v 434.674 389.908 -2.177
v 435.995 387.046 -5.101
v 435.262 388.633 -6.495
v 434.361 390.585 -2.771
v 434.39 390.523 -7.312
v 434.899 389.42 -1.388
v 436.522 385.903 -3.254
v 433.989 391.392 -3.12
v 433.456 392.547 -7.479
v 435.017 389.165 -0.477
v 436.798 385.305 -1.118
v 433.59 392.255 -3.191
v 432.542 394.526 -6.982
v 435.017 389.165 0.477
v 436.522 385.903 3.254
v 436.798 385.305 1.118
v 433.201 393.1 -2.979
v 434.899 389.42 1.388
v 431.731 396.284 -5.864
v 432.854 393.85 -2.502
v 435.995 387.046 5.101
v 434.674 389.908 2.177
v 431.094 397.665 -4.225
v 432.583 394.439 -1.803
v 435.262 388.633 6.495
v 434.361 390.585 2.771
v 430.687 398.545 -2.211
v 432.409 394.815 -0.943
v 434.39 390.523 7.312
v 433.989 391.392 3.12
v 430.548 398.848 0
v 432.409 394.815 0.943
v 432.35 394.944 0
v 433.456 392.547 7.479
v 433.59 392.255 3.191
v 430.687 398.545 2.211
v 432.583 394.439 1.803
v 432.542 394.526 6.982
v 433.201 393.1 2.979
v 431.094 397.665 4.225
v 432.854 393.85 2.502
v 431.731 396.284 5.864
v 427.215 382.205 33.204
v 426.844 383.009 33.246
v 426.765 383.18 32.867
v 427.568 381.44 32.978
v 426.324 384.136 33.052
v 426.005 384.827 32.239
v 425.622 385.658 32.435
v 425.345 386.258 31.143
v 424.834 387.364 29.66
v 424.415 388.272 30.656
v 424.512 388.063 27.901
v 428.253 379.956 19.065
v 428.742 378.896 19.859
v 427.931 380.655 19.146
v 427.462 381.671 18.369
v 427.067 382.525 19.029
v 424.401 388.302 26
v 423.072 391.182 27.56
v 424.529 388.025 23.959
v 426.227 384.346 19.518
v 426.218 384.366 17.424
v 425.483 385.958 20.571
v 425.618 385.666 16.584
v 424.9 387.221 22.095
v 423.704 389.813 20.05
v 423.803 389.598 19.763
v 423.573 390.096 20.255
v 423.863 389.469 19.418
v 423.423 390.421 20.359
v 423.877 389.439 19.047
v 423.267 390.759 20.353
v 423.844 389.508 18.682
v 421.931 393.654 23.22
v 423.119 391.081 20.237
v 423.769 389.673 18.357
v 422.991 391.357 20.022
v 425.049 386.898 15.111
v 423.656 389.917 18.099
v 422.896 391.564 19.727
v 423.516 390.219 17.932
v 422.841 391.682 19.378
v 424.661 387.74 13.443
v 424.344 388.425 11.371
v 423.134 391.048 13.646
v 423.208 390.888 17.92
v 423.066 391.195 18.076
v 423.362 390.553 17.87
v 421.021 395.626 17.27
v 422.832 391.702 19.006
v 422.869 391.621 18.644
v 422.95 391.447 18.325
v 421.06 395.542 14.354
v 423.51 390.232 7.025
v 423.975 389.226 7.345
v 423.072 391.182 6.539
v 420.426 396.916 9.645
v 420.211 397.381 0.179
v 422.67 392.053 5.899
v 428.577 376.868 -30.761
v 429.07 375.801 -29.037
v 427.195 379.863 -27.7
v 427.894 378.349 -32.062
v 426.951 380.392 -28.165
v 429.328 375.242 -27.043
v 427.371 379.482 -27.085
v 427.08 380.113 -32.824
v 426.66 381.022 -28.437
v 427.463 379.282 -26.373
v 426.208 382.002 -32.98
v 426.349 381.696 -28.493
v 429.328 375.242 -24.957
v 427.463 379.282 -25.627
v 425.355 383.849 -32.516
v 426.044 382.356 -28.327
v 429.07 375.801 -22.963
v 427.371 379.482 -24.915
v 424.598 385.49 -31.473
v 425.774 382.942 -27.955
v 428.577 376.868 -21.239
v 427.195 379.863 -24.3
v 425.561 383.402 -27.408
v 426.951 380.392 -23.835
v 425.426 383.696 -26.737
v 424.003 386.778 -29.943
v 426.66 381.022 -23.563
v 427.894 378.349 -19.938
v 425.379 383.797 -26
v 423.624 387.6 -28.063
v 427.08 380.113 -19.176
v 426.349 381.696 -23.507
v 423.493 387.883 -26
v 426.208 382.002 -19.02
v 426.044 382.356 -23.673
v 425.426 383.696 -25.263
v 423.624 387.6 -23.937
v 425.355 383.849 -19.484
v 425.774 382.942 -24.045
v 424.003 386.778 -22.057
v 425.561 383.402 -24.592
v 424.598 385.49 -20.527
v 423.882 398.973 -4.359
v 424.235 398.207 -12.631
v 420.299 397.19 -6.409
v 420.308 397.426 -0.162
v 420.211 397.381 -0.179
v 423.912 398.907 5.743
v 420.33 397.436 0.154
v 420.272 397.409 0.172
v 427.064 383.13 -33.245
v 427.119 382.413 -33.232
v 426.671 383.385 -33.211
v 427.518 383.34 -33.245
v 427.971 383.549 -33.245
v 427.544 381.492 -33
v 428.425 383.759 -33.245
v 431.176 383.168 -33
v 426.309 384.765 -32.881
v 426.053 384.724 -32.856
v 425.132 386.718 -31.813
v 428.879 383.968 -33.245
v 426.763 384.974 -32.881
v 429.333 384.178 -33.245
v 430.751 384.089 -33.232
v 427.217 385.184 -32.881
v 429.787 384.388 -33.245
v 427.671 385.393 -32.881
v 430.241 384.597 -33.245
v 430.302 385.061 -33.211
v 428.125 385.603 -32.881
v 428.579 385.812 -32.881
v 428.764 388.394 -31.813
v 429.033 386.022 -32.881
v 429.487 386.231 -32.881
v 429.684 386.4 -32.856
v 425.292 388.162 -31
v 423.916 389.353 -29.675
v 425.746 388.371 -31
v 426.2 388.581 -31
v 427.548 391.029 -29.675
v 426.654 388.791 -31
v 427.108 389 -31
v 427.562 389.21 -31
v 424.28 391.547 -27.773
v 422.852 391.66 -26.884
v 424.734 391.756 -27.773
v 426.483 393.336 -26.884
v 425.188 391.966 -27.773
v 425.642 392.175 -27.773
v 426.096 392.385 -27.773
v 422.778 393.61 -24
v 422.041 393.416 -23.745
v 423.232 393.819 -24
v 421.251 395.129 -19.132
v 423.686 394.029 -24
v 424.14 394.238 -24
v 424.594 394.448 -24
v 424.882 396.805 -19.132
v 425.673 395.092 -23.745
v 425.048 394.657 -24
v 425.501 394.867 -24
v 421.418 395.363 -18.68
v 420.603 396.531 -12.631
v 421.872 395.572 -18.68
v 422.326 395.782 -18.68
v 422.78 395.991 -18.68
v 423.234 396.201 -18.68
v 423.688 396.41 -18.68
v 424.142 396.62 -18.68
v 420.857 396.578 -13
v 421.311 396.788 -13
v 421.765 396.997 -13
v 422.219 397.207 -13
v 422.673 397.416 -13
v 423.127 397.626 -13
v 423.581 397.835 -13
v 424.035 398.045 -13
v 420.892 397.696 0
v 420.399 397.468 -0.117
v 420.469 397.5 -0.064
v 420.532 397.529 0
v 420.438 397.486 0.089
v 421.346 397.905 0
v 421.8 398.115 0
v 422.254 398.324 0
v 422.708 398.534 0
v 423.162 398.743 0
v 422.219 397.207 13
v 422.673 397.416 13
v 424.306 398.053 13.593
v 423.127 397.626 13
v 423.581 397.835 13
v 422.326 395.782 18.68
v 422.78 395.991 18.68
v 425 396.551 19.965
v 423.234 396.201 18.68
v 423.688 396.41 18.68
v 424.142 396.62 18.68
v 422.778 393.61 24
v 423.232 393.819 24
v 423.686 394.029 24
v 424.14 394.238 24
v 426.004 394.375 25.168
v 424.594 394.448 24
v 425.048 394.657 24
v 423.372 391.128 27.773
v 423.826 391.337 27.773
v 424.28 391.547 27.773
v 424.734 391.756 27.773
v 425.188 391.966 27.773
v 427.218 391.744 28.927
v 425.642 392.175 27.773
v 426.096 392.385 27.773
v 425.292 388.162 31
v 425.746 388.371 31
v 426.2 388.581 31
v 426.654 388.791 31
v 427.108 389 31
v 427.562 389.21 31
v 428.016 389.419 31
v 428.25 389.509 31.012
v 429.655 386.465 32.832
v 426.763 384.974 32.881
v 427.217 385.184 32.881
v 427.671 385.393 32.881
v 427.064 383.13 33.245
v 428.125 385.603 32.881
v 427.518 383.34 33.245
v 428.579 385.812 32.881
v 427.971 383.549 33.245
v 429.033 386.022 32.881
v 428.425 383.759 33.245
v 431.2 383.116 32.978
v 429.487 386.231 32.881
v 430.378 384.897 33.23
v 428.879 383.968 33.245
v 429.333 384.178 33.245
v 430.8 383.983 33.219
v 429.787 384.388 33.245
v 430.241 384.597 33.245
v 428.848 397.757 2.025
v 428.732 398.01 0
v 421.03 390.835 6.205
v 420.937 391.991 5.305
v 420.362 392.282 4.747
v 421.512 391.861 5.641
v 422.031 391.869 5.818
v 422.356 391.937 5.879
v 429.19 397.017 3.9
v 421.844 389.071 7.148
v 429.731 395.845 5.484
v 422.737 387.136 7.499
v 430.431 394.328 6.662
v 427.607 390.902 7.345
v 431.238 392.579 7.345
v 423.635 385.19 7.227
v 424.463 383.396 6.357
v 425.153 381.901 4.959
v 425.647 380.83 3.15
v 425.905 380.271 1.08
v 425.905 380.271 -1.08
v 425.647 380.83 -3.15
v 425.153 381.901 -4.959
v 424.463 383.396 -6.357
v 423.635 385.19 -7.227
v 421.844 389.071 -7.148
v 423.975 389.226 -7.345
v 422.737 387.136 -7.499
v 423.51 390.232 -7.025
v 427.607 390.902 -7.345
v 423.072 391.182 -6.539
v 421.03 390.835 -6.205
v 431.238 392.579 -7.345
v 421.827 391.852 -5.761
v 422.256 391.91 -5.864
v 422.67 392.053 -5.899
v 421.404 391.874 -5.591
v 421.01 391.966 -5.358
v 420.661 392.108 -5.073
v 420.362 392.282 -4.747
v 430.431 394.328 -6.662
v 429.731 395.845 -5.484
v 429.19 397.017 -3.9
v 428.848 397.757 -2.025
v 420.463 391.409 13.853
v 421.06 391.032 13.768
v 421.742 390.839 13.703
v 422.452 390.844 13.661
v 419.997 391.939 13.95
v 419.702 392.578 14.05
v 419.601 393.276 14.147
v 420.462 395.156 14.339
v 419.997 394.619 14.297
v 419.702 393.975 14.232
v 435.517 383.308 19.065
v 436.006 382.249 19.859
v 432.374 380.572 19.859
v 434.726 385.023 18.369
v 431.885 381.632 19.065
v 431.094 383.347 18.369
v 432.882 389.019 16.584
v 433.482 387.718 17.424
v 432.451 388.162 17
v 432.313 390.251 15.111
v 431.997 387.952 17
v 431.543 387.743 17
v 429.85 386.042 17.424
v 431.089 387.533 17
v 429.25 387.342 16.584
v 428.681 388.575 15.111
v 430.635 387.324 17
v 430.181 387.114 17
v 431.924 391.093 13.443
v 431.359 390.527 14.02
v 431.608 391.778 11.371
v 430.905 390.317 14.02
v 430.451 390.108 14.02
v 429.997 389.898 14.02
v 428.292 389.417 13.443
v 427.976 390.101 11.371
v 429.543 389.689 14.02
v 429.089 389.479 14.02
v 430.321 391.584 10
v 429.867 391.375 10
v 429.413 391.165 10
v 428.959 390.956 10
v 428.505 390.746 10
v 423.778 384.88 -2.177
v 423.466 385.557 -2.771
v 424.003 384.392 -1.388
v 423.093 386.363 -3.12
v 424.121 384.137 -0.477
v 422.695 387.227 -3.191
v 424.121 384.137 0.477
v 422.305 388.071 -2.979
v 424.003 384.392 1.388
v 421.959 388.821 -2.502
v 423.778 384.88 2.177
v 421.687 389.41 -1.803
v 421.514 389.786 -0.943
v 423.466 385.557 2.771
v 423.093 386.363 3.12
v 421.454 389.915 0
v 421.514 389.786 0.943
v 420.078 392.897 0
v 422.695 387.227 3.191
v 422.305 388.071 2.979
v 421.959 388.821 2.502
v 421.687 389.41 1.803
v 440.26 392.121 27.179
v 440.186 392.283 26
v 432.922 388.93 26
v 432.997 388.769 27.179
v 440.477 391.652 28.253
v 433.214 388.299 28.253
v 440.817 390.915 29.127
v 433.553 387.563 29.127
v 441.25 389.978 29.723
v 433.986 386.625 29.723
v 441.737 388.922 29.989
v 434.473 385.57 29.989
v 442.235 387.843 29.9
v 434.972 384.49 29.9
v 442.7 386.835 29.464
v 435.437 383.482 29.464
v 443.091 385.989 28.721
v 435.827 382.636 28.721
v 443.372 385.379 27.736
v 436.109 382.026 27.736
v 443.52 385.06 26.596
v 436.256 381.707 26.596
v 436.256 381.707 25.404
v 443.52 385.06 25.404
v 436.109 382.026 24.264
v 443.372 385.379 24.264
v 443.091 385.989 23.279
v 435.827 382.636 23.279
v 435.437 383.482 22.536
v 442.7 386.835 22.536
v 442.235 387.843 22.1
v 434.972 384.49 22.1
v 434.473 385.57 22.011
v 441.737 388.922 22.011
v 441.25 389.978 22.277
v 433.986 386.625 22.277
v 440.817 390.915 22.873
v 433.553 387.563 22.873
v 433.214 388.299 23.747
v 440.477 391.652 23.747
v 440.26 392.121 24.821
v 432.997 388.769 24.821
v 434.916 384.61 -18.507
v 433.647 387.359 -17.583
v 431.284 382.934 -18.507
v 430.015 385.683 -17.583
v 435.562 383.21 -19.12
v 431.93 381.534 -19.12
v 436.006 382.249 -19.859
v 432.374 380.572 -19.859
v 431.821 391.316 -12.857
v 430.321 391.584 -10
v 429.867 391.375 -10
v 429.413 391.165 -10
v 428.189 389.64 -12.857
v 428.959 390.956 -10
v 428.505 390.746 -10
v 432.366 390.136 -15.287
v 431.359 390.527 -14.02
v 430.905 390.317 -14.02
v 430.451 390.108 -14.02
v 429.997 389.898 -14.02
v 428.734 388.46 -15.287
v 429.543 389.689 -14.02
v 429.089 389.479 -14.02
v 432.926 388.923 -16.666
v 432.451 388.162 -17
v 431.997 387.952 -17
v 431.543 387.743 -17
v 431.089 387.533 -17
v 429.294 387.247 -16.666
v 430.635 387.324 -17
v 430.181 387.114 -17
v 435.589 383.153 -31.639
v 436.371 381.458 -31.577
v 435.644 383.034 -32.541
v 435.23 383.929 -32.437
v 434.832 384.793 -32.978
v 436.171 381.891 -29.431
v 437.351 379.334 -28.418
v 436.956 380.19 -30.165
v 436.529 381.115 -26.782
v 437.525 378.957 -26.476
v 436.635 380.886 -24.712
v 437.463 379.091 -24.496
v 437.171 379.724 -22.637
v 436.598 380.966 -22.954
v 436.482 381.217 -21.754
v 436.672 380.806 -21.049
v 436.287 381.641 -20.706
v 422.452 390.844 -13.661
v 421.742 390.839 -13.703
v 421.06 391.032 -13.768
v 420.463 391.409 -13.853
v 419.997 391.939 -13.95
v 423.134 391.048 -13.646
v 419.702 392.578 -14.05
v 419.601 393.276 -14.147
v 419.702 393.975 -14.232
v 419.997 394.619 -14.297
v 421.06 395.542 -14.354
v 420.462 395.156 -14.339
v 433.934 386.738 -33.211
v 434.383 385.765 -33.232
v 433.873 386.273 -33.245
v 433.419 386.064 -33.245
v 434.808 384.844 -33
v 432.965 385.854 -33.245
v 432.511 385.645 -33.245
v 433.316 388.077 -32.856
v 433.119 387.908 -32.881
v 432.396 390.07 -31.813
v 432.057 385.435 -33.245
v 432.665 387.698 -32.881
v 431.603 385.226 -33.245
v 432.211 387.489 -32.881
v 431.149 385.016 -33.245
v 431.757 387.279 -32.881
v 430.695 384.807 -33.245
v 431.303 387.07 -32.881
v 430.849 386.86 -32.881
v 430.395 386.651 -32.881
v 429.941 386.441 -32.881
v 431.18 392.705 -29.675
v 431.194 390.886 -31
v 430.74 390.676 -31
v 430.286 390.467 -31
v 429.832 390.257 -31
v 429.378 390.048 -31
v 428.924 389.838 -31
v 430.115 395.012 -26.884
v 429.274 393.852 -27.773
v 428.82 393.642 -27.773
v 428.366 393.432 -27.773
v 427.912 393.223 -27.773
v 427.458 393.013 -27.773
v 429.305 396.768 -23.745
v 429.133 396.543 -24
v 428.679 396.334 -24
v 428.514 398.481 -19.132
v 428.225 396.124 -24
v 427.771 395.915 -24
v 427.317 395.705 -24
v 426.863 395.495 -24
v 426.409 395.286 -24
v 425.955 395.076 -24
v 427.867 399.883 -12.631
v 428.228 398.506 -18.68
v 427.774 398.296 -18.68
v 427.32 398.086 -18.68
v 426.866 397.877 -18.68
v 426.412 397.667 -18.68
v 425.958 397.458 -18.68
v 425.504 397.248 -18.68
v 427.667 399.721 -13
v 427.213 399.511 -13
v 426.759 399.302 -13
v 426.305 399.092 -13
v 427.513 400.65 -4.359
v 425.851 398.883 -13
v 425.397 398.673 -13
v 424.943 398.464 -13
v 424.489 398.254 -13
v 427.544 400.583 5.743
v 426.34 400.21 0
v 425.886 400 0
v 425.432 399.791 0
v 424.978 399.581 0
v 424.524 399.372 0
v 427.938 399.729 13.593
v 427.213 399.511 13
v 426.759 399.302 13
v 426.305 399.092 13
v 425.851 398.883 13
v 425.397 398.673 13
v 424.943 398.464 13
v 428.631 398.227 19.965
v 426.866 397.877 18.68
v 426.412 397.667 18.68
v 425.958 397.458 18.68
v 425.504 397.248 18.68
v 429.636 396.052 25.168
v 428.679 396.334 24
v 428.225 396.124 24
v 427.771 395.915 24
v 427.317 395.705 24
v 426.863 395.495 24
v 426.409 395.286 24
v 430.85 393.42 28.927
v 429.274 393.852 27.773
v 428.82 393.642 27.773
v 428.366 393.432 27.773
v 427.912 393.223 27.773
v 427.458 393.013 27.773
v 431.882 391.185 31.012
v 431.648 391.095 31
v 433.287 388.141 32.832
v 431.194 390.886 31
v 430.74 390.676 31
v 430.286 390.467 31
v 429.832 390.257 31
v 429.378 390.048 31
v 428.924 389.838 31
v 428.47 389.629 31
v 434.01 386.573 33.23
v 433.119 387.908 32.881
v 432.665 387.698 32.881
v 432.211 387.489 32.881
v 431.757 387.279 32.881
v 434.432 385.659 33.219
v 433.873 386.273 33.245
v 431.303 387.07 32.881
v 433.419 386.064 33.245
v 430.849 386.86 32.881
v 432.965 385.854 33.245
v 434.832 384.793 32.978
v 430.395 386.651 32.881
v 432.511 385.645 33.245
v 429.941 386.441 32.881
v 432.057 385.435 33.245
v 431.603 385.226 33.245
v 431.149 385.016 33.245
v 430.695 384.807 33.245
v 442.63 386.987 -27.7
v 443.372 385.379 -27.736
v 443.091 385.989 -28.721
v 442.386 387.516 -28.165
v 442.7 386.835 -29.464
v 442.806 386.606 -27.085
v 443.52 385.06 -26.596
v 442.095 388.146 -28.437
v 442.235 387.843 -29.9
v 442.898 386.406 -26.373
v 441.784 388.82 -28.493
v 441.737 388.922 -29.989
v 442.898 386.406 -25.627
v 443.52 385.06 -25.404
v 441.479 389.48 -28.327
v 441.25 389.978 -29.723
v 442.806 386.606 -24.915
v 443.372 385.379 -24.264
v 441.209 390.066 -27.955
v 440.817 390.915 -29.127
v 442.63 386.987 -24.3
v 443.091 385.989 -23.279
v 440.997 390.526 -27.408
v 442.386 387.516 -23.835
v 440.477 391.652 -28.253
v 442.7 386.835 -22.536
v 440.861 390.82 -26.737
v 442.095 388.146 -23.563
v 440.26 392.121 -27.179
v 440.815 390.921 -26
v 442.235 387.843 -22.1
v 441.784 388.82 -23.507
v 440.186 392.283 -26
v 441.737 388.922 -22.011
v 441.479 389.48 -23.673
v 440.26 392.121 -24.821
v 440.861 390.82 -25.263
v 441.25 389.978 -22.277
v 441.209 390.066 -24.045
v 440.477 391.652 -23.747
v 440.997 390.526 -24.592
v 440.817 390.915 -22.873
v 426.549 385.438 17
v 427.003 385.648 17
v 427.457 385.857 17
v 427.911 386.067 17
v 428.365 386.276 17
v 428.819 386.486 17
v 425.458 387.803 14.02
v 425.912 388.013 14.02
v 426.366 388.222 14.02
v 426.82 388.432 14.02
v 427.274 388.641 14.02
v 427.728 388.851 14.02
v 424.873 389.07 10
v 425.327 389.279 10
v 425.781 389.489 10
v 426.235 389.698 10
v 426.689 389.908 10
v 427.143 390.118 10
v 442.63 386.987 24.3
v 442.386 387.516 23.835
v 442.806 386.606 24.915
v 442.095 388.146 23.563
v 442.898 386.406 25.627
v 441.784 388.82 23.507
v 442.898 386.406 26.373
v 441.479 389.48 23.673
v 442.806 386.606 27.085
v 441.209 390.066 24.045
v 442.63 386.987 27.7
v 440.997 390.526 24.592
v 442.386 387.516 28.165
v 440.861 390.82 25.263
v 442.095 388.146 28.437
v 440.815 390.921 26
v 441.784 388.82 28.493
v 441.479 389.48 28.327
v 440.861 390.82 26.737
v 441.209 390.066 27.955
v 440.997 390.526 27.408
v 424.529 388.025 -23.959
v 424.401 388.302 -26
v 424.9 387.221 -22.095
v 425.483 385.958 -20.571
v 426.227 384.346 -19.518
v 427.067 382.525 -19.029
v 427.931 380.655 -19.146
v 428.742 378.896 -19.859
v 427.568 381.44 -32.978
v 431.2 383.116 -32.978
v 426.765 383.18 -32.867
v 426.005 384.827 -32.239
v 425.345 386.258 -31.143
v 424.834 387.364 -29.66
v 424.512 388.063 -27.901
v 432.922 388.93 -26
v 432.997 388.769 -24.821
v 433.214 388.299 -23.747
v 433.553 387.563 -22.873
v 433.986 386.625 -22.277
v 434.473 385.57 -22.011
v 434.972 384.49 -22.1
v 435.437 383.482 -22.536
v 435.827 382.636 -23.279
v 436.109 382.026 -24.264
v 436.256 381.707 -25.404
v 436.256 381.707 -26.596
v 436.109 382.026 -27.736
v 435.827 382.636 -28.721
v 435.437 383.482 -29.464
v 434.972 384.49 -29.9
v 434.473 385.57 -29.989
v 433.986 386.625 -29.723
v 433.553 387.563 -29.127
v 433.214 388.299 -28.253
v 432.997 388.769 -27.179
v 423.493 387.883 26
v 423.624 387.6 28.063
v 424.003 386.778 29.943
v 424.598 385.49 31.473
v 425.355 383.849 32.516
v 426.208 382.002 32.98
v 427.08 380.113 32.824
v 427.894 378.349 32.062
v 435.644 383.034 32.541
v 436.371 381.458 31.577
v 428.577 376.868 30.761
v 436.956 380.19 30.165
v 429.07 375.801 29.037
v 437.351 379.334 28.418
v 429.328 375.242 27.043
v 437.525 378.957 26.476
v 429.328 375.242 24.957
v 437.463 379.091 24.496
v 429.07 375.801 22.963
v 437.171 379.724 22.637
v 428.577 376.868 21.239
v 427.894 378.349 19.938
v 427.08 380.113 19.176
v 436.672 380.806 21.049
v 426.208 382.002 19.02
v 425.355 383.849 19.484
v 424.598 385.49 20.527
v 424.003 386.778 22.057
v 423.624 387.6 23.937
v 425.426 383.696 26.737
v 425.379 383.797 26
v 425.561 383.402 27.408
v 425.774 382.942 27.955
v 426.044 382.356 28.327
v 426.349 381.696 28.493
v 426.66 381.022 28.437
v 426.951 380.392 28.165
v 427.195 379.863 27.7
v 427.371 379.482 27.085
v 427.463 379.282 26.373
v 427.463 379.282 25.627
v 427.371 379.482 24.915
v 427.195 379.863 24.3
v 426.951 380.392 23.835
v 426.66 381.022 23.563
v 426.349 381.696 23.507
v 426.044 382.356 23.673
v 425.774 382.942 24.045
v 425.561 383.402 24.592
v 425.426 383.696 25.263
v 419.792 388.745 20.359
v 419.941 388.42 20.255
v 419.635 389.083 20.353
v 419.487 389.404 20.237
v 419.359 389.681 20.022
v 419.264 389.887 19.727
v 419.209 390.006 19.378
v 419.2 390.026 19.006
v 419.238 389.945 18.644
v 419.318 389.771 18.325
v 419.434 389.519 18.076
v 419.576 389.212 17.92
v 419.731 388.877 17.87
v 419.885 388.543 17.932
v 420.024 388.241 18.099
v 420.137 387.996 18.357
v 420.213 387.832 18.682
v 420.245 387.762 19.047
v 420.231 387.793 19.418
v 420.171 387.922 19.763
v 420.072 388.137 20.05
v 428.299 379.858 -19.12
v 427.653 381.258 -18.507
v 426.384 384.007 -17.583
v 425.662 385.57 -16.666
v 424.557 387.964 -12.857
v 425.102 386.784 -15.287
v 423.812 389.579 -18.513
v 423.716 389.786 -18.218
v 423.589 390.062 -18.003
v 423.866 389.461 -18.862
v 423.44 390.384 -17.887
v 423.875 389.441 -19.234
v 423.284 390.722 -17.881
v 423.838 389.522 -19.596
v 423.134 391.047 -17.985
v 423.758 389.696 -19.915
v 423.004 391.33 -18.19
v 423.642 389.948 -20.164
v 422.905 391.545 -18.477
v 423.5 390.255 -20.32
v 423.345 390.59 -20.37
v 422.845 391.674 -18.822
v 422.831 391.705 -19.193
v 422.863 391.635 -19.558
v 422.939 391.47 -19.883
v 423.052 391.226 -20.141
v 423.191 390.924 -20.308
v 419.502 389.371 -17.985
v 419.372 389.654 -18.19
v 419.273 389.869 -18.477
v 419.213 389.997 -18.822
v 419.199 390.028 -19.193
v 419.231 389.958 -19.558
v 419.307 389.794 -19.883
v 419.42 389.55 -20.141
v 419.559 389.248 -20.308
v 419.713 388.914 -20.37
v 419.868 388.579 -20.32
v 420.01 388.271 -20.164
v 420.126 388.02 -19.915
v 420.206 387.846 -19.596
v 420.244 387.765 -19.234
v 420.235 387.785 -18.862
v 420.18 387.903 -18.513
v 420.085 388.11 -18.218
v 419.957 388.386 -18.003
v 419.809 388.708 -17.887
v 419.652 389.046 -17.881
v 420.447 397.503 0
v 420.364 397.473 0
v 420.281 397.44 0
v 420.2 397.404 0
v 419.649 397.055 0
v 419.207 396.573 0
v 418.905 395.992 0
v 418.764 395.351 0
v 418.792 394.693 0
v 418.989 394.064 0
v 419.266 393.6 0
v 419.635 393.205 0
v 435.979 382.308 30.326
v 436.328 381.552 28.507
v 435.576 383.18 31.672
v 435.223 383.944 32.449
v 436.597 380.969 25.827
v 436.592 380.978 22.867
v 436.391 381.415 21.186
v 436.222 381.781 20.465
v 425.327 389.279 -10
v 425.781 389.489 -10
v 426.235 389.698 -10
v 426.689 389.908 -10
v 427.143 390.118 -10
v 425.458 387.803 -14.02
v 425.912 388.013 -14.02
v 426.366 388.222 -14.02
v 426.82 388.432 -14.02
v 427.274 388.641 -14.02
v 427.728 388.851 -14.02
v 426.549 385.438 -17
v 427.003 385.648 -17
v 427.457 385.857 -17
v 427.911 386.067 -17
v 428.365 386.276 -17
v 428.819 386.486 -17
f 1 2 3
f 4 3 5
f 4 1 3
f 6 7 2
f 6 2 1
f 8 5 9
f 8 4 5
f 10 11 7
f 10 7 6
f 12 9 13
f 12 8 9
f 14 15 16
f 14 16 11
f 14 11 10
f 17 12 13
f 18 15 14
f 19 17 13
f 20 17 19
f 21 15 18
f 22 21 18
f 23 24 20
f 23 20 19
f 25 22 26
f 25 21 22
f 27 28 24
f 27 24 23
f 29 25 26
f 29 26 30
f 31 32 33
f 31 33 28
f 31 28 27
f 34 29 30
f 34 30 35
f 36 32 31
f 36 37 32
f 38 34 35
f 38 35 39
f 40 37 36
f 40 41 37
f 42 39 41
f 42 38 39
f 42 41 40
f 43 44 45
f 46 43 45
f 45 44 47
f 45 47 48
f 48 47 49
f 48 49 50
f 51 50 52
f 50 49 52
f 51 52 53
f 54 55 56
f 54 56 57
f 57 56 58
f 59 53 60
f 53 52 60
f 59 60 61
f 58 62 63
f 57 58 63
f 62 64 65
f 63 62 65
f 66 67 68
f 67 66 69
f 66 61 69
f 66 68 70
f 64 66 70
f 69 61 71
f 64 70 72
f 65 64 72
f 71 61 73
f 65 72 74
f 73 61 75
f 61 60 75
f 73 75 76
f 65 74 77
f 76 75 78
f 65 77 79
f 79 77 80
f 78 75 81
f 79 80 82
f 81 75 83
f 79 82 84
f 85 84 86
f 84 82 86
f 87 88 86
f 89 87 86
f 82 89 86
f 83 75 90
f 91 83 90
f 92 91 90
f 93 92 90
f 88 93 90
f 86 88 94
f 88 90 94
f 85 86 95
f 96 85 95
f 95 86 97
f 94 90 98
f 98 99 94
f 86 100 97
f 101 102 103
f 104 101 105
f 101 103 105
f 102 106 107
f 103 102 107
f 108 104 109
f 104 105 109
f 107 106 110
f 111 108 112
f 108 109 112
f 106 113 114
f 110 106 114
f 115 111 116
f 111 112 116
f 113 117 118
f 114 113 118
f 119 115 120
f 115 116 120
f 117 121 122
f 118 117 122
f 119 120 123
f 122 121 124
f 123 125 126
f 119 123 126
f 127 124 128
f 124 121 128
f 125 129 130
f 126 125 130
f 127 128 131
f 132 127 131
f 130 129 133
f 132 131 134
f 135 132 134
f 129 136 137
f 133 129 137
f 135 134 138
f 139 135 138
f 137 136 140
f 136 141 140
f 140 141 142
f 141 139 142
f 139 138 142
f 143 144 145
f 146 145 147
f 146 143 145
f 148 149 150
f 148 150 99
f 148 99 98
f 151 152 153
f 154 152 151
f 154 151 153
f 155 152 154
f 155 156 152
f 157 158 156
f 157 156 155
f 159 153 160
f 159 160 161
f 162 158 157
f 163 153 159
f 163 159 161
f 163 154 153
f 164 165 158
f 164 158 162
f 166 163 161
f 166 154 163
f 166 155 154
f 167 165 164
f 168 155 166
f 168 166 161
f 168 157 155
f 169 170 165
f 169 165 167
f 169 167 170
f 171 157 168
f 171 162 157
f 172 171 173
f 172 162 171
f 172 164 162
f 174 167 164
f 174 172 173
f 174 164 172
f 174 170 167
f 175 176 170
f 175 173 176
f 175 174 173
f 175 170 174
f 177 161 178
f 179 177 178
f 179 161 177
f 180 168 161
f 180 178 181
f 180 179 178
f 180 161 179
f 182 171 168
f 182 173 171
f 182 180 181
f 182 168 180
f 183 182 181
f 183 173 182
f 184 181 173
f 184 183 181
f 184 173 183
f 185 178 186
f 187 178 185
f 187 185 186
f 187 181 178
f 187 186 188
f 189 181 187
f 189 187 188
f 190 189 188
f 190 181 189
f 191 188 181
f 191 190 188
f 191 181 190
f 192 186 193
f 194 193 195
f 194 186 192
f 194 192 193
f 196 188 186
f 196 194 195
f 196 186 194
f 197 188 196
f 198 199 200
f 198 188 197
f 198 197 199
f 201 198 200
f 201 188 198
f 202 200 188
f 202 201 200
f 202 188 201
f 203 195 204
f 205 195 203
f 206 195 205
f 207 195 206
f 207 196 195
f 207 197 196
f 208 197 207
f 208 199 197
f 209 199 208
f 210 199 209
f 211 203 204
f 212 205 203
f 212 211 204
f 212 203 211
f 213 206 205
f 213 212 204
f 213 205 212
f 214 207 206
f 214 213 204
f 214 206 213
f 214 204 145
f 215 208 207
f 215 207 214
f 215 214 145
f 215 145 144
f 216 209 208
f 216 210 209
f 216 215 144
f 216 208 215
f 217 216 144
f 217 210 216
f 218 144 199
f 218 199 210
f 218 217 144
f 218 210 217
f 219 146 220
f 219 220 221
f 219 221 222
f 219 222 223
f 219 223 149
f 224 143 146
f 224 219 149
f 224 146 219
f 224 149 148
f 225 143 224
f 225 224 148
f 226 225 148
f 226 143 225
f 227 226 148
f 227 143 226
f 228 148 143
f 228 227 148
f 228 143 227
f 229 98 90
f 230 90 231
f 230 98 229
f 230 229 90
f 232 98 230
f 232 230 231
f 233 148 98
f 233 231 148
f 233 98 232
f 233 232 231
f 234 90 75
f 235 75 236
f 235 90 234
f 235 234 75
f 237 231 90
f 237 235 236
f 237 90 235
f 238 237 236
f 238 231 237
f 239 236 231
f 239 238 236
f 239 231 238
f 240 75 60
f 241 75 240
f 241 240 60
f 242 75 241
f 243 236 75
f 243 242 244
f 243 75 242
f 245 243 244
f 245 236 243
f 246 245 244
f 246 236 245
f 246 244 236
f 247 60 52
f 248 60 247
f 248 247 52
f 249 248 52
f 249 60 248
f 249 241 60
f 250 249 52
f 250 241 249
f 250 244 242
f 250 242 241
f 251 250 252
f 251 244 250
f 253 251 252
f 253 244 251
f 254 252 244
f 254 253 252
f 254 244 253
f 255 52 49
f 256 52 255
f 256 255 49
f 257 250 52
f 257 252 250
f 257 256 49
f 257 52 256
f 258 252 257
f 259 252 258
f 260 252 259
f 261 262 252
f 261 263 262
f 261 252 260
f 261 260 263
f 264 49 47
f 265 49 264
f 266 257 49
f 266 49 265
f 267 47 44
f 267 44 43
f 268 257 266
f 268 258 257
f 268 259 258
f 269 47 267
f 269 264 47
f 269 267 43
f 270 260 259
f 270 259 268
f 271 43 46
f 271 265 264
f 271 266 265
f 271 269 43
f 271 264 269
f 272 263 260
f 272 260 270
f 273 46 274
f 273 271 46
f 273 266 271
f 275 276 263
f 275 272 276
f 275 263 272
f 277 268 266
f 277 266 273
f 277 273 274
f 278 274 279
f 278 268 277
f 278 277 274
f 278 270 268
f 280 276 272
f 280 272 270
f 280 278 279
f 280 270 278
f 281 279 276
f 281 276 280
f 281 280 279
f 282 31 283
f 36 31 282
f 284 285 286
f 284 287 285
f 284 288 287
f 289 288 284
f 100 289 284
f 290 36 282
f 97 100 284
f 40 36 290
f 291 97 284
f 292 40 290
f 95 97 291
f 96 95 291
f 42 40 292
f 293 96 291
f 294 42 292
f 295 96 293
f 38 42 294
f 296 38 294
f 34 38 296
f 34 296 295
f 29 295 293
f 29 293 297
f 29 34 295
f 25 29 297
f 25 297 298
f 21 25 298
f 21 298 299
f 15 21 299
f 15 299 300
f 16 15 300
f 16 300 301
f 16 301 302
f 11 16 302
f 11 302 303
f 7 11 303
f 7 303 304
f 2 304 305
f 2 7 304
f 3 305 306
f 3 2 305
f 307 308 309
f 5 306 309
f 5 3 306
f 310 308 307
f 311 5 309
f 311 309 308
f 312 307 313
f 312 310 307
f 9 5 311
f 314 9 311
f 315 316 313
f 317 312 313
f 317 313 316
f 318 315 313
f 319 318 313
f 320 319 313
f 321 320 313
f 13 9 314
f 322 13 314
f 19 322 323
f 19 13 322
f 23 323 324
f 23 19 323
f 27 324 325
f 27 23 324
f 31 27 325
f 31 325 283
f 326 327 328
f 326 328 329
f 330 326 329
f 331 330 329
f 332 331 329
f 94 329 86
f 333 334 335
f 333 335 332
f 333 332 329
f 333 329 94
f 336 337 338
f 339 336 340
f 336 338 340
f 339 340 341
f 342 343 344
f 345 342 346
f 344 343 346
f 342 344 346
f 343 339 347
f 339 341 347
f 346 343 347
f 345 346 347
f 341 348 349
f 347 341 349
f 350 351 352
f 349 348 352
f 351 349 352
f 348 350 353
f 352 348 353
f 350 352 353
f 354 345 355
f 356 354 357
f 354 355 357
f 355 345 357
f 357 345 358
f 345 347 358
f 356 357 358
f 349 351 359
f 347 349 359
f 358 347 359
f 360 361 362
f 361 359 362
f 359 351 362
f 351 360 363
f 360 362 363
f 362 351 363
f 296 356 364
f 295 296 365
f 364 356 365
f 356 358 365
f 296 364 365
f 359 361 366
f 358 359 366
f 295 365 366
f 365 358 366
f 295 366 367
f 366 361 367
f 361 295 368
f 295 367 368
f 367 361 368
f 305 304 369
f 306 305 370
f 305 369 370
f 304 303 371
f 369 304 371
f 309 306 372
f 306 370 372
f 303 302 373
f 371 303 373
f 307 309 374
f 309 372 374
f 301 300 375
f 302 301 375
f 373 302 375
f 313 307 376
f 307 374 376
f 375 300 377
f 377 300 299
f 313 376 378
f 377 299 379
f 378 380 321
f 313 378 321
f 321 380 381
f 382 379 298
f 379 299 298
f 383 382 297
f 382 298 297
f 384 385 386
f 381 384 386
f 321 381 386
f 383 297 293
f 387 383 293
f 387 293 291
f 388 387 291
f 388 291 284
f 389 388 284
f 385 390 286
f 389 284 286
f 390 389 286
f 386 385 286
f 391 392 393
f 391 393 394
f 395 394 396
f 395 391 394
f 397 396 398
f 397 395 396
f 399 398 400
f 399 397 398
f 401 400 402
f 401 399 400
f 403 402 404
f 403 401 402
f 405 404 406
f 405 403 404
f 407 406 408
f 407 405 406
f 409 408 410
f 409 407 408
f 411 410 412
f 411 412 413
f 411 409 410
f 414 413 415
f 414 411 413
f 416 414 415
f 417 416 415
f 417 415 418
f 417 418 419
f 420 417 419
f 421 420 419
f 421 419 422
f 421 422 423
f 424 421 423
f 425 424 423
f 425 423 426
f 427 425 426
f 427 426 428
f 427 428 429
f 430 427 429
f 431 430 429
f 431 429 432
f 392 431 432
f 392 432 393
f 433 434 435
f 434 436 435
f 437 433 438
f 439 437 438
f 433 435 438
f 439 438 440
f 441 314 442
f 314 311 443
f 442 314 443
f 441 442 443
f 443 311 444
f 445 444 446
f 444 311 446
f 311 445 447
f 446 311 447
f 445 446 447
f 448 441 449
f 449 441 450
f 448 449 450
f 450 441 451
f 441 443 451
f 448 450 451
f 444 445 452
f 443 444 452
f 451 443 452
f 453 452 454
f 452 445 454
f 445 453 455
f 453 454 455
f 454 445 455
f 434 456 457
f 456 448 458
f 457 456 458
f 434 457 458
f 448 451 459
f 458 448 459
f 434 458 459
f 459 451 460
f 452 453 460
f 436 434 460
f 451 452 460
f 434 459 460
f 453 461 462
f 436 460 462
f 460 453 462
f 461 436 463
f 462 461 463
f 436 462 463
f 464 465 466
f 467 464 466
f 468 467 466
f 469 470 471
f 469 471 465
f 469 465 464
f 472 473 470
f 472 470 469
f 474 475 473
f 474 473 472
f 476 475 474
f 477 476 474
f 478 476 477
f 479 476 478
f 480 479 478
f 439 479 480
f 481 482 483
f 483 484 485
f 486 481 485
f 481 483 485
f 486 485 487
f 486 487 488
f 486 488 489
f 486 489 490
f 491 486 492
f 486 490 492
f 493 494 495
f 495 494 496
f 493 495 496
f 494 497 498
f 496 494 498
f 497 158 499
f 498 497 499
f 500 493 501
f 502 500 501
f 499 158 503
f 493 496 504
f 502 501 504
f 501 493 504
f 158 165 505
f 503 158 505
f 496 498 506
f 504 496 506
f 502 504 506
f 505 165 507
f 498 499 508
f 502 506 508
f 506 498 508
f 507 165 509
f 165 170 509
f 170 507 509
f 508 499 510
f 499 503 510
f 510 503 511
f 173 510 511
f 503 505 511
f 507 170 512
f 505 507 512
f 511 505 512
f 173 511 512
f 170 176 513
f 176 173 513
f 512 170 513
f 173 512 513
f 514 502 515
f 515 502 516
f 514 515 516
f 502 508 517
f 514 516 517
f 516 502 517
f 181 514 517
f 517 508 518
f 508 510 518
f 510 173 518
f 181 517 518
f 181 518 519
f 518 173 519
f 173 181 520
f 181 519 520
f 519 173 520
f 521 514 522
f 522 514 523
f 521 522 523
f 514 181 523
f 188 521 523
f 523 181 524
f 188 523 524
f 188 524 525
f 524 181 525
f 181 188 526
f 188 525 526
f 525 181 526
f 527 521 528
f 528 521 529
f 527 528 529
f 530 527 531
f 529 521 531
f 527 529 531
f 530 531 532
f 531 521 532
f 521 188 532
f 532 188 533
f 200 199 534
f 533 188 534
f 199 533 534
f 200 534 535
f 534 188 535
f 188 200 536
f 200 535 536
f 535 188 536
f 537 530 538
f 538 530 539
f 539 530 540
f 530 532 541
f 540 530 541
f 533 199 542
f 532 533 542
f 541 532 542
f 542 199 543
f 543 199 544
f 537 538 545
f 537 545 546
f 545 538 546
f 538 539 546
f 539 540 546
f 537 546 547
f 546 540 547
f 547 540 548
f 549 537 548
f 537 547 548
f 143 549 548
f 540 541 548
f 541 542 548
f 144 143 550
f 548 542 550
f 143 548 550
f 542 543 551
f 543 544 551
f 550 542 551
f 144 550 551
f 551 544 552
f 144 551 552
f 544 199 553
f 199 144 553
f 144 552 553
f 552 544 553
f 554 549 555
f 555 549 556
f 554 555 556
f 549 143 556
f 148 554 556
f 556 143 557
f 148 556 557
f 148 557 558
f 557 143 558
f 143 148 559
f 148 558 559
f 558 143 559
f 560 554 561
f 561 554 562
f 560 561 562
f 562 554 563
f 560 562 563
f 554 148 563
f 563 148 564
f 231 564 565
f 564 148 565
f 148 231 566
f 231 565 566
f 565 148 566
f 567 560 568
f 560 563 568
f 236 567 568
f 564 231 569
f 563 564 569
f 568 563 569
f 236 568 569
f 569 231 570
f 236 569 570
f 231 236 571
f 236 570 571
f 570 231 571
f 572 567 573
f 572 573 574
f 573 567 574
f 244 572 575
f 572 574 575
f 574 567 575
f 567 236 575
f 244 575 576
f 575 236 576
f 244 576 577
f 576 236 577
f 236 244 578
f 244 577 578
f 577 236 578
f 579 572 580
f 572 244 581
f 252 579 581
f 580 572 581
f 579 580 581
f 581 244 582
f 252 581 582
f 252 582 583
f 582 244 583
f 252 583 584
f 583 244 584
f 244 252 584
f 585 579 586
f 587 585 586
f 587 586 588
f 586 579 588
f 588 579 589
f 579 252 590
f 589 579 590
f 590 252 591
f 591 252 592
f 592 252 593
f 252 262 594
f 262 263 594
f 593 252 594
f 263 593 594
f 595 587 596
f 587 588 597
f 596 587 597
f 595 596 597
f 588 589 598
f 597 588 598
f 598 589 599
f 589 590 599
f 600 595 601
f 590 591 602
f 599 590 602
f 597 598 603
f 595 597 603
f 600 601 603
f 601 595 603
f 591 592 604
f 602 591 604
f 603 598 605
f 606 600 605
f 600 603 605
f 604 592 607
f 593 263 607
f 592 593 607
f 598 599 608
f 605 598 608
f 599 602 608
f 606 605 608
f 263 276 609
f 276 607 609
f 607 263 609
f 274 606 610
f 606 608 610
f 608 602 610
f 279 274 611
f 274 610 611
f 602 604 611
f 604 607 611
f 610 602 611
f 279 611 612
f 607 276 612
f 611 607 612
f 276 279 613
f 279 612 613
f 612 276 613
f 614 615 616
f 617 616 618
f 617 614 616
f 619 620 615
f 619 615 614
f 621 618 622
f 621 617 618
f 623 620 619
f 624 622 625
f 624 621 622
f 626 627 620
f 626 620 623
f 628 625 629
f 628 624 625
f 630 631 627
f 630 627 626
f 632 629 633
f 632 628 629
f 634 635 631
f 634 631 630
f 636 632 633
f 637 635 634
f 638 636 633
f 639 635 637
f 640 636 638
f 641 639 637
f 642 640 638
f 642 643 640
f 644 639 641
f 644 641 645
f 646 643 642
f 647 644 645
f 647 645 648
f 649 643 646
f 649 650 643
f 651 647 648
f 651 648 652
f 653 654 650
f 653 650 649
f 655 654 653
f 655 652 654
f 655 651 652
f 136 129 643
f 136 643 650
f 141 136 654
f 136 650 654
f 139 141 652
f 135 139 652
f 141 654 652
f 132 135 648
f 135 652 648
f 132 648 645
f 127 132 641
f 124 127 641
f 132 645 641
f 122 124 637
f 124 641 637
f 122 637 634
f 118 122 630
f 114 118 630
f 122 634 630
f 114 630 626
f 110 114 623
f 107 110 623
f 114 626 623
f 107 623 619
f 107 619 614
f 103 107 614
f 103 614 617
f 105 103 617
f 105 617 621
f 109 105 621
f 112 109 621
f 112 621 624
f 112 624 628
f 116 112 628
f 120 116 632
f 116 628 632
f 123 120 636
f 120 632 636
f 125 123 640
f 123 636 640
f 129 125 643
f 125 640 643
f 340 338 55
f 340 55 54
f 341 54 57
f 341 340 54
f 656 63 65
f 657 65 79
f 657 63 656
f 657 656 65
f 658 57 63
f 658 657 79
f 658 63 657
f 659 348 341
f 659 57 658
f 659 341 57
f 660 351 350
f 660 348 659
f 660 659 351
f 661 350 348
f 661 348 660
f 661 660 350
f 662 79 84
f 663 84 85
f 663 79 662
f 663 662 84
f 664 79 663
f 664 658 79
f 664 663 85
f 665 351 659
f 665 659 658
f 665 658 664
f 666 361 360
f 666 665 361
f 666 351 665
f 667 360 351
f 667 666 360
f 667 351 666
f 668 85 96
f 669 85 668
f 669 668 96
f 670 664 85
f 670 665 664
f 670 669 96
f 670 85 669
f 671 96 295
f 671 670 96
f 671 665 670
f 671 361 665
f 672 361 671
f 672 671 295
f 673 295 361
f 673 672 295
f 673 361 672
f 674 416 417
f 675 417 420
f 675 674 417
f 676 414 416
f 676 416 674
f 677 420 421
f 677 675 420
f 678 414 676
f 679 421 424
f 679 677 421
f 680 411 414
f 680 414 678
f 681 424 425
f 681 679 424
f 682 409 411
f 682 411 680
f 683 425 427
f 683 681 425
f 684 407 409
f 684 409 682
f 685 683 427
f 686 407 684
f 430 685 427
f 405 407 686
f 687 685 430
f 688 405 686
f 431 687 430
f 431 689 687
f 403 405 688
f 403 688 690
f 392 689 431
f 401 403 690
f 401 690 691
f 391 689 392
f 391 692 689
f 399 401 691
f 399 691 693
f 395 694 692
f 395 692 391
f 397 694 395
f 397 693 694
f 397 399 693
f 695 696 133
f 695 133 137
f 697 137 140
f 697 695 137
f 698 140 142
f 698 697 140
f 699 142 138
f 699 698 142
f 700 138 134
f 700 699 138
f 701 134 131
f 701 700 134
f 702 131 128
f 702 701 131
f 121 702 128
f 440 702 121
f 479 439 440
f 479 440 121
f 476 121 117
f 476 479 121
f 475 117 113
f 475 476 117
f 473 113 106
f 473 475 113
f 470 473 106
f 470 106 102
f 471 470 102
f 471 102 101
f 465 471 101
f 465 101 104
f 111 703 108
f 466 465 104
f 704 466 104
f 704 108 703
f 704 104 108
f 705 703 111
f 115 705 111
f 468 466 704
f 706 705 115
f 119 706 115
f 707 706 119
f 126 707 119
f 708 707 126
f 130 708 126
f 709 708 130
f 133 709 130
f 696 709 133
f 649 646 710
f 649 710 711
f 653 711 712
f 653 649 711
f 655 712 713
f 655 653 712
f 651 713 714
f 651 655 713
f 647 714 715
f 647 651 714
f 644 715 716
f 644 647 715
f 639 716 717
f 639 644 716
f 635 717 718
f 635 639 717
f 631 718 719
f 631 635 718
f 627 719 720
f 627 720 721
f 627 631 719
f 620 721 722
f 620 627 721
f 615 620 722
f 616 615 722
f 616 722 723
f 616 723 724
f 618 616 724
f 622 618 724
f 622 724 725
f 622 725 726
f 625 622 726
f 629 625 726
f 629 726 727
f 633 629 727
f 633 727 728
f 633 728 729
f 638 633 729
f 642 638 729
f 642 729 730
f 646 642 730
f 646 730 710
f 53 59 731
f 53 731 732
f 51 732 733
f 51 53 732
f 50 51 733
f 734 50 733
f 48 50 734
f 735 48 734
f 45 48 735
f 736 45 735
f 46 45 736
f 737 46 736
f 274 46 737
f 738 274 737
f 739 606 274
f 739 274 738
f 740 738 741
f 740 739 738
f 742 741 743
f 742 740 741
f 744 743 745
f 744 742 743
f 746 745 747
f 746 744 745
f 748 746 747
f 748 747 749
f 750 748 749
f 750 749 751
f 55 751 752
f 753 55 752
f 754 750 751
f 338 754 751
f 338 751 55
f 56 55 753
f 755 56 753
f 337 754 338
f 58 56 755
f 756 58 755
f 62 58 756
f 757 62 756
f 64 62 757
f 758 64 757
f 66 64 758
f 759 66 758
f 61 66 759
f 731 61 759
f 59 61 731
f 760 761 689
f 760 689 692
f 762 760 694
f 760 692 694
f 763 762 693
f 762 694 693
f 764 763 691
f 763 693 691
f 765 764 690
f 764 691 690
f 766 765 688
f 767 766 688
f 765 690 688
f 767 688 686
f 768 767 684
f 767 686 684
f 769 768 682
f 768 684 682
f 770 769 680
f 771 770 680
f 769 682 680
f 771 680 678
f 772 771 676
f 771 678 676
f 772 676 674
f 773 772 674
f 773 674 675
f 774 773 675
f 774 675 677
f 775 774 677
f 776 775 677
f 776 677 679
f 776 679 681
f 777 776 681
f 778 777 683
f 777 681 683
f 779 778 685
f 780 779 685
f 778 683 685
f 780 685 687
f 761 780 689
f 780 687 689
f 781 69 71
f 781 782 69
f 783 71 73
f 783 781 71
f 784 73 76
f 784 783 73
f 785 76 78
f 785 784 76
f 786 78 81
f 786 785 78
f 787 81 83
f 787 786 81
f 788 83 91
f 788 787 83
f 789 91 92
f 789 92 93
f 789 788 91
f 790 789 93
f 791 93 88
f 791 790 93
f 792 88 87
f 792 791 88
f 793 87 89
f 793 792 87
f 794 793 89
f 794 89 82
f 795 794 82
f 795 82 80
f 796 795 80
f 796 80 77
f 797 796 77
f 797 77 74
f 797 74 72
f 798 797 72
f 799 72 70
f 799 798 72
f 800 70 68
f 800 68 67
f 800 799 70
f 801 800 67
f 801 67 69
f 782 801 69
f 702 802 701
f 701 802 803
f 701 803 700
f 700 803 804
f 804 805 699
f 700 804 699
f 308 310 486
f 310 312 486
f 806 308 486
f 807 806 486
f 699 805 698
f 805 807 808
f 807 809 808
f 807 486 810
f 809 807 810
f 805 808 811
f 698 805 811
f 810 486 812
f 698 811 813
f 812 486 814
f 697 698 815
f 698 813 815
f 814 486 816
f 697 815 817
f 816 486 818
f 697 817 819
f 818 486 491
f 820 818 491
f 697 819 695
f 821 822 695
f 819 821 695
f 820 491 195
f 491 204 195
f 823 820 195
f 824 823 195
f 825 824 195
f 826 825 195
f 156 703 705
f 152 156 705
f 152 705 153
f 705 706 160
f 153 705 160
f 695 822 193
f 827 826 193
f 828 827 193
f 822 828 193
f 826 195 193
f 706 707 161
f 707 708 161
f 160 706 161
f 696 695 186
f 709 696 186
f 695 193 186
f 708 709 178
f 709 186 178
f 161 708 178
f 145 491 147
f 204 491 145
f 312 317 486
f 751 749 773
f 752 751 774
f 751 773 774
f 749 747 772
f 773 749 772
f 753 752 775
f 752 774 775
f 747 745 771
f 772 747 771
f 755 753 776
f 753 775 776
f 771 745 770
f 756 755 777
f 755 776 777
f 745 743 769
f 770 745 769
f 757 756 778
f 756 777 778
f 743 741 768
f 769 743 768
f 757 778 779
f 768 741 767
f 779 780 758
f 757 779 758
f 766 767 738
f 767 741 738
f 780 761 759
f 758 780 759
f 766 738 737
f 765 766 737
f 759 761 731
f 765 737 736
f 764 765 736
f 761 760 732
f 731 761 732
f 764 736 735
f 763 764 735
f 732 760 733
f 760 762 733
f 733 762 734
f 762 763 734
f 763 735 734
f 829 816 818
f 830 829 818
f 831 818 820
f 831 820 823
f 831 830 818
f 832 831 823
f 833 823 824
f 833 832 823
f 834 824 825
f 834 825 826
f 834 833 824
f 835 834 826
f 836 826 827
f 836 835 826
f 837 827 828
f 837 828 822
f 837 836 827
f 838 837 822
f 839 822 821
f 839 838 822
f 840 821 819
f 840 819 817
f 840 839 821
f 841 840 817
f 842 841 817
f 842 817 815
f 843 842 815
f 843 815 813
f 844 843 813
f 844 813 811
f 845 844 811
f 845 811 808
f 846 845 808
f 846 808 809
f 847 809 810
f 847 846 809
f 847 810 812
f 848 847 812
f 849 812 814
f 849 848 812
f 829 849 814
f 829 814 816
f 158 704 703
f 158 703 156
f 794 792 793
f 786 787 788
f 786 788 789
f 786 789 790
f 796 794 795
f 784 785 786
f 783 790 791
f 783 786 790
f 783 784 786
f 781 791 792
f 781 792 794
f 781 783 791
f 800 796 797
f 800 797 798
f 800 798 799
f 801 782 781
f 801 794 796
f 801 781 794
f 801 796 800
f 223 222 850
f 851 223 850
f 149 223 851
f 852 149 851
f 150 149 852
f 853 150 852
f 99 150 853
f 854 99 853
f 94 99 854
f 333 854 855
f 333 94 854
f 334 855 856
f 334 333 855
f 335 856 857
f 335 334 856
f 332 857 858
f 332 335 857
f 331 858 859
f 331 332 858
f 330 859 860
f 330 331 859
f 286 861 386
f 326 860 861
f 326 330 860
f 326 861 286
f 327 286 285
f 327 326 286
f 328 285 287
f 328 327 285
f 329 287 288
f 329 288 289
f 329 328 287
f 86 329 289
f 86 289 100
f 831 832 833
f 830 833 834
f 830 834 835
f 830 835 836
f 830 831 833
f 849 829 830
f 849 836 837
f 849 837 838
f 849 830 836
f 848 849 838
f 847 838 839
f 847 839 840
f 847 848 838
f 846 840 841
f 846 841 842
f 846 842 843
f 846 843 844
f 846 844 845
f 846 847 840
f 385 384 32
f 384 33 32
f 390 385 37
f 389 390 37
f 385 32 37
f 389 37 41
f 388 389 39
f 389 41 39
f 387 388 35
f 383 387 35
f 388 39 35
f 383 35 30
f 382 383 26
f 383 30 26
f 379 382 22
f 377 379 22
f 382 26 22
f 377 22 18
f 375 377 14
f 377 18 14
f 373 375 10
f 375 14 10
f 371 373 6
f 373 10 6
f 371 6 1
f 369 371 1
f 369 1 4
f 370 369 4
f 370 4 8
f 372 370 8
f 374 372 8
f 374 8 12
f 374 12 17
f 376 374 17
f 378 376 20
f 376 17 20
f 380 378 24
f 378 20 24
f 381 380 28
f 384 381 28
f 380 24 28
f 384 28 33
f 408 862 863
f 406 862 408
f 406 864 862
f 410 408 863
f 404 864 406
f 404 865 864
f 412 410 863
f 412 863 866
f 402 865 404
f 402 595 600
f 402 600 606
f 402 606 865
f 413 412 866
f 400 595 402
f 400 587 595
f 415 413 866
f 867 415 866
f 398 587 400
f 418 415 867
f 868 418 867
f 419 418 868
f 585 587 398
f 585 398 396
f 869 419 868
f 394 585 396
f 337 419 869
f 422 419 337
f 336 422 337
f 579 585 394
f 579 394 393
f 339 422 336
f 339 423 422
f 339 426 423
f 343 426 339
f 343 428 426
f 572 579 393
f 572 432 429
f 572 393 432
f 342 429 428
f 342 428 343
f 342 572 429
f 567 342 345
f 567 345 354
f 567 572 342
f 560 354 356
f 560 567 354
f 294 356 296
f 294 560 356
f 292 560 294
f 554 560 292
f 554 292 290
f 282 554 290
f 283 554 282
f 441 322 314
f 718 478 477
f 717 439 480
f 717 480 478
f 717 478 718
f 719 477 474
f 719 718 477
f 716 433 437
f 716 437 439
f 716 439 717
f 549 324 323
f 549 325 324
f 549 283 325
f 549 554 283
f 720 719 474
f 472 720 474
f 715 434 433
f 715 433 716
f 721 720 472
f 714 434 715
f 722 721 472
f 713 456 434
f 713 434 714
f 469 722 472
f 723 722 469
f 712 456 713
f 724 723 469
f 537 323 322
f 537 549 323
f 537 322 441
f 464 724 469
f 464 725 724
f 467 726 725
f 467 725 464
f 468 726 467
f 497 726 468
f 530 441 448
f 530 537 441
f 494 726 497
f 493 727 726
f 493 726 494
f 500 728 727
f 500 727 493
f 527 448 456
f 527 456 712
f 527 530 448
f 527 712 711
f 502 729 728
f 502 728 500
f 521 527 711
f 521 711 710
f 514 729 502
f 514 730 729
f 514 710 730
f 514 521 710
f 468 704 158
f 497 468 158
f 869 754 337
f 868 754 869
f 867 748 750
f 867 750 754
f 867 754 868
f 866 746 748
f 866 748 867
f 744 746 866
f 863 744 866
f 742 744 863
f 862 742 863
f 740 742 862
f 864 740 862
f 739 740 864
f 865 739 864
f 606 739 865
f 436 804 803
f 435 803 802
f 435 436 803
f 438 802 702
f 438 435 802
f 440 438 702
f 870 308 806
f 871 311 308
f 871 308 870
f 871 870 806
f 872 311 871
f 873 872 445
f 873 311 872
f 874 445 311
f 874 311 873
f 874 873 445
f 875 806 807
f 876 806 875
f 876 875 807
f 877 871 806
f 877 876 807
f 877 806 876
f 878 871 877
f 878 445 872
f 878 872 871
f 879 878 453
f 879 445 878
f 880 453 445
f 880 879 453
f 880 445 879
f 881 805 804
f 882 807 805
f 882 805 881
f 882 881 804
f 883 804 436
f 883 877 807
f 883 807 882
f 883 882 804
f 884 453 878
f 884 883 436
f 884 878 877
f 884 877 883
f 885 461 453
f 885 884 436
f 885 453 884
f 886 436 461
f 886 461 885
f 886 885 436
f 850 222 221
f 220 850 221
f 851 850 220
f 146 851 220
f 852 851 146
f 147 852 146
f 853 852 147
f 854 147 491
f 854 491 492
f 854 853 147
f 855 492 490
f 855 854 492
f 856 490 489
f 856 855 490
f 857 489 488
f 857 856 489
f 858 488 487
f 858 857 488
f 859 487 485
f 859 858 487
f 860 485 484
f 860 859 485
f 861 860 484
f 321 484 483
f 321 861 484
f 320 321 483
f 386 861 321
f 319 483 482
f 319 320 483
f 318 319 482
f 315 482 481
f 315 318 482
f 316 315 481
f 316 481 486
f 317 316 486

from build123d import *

# Parameters (mm, degrees)
ARCO_DEPTH                  = 4
NERVIO_PROFILE_R            = 2.5
BUJE_CENTRAL_PROFILE_R      = 7.5
BUJE_PIVOTE_IZQ_PROFILE_R   = 7
PIVOTE_IZQ_PROFILE_R        = 4
TOPE_MUELLE_IZQ_PROFILE_R   = 1.25
BUJE_PIVOTE_DCHO_PROFILE_R  = 7
PIVOTE_DCHO_PROFILE_R       = 4
TOPE_MUELLE_DCHO_PROFILE_R  = 1.25
TALADRO_CENTRAL_PROFILE_R   = 3.2
ROSCA_PIVOTE_IZQ_PROFILE_R  = 2.5
ROSCA_PIVOTE_DCHO_PROFILE_R = 2.5


with BuildPart() as part:
    # Sk_Arco → Arco (new, symmetric)
    with BuildSketch(Plane(origin=(501.248292683, 231.345365854, 0), x_dir=(0, 0, 1), z_dir=(-0.9079593845004519, -0.41905817746174673, 0))):
        with BuildLine():
            add(Edge.make_bspline(
                [(-33, 167.213202705), (-33.809816396, 169.344461115), (-30.928090457, 175.483754763), (-23.700876042, 181.126046734), (-12.514498078, 184.250371428), (0, 184.958692509), (12.514498078, 184.250371428), (23.700876042, 181.126046734), (30.928090457, 175.483754763), (36.139987599, 164.380212062), (18.204481714, 160.219142822), (18.333257884, 172.472368475), (9.189019684, 175.889853969), (0, 176.39261915), (-9.189019684, 175.889853969), (-18.333257884, 172.472368475), (-18.204481714, 160.219142822), (-31.51591549, 163.307419115), (-33, 167.213202705)],
                knots=[0, 0, 0, 0, 0.045414951, 0.102928529, 0.174938813, 0.256275294, 0.337611775, 0.409622059, 0.467135637, 0.512550588, 0.595778868, 0.643287761, 0.693581925, 0.756275294, 0.818968662, 0.869262827, 0.91677172, 1, 1, 1, 1], degree=3))
        make_face()
    extrude(amount=ARCO_DEPTH, both=True)

    # Nervio: sweep along a curve in space
    with BuildLine() as nervio_path:
        Line((422.096638865, 393.295401751, -14), (421.25852251, 395.11132052, 0))
        Line((421.25852251, 395.11132052, 0), (422.096638865, 393.295401751, 14))
    # Nervio profile (on start of the path) → Nervio (sweep)
    with BuildSketch(Plane(origin=(422.096638865, 393.295401751, -14), x_dir=(0, 0.9916925343228529, -0.12863093472534984), z_dir=(-0.05926377579897181, 0.12840484756444362, 0.9899494936611671))):
        Circle(NERVIO_PROFILE_R)
    sweep(path=nervio_path.line, transition=Transition.RIGHT)

    # Buje_central: sweep along a curve in space
    with BuildLine() as buje_central_path:
        Line((422.795069161, 387.009529089, 0), (433.690581775, 392.038227218, 0))
    # Buje_central profile (on start of the path) → Buje_central (sweep)
    with BuildSketch(Plane(origin=(422.795069161, 387.009529089, 0), x_dir=(-0.4190581774617505, 0.90795938450045, 0), z_dir=(0.90795938450045, 0.4190581774617505, 0))):
        Circle(BUJE_CENTRAL_PROFILE_R)
    sweep(path=buje_central_path.line)

    # Buje_pivote_izq: sweep along a curve in space
    with BuildLine() as buje_pivote_izq_path:
        Line((426.426906699, 381.526851267, -26), (434.598541159, 385.298374864, -26))
    # Buje_pivote_izq profile (on start of the path) → Buje_pivote_izq (sweep)
    with BuildSketch(Plane(origin=(426.426906699, 381.526851267, -26), x_dir=(-0.41905817746174817, 0.9079593845004512, 0), z_dir=(0.9079593845004512, 0.41905817746174817, 0))):
        Circle(BUJE_PIVOTE_IZQ_PROFILE_R)
    sweep(path=buje_pivote_izq_path.line)

    # Pivote_izq: sweep along a curve in space
    with BuildLine() as pivote_izq_path:
        Line((434.598541159, 385.298374864, -26), (441.862216235, 388.650840284, -26))
    # Pivote_izq profile (on start of the path) → Pivote_izq (sweep)
    with BuildSketch(Plane(origin=(434.598541159, 385.298374864, -26), x_dir=(-0.4190581774617438, 0.9079593845004531, 0), z_dir=(0.9079593845004531, 0.4190581774617438, 0))):
        Circle(PIVOTE_IZQ_PROFILE_R)
    sweep(path=pivote_izq_path.line)

    # Tope_muelle_izq: sweep along a curve in space
    with BuildLine() as tope_muelle_izq_path:
        Line((425.169732166, 391.409639952, -16.12), (425.169732166, 391.409639952, -19.12))
        Line((425.169732166, 391.409639952, -19.12), (419.721975859, 388.895290887, -19.12))
    # Tope_muelle_izq profile (on start of the path) → Tope_muelle_izq (sweep)
    with BuildSketch(Plane(origin=(425.169732166, 391.409639952, -16.12), x_dir=(-1, 0, 0), z_dir=(0, 0, -1))):
        Circle(TOPE_MUELLE_IZQ_PROFILE_R)
    sweep(path=tope_muelle_izq_path.line, transition=Transition.RIGHT)

    # Buje_pivote_dcho: sweep along a curve in space
    with BuildLine() as buje_pivote_dcho_path:
        Line((426.426906699, 381.526851267, 26), (434.598541159, 385.298374864, 26))
    # Buje_pivote_dcho profile (on start of the path) → Buje_pivote_dcho (sweep)
    with BuildSketch(Plane(origin=(426.426906699, 381.526851267, 26), x_dir=(-0.41905817746174817, 0.9079593845004512, 0), z_dir=(0.9079593845004512, 0.41905817746174817, 0))):
        Circle(BUJE_PIVOTE_DCHO_PROFILE_R)
    sweep(path=buje_pivote_dcho_path.line)

    # Pivote_dcho: sweep along a curve in space
    with BuildLine() as pivote_dcho_path:
        Line((434.598541159, 385.298374864, 26), (441.862216235, 388.650840284, 26))
    # Pivote_dcho profile (on start of the path) → Pivote_dcho (sweep)
    with BuildSketch(Plane(origin=(434.598541159, 385.298374864, 26), x_dir=(-0.4190581774617438, 0.9079593845004531, 0), z_dir=(0.9079593845004531, 0.4190581774617438, 0))):
        Circle(PIVOTE_DCHO_PROFILE_R)
    sweep(path=pivote_dcho_path.line)

    # Tope_muelle_dcho: sweep along a curve in space
    with BuildLine() as tope_muelle_dcho_path:
        Line((425.169732166, 391.409639952, 16.12), (425.169732166, 391.409639952, 19.12))
        Line((425.169732166, 391.409639952, 19.12), (419.721975859, 388.895290887, 19.12))
    # Tope_muelle_dcho profile (on start of the path) → Tope_muelle_dcho (sweep)
    with BuildSketch(Plane(origin=(425.169732166, 391.409639952, 16.12), x_dir=(1, 0, 0), z_dir=(0, 0, 1))):
        Circle(TOPE_MUELLE_DCHO_PROFILE_R)
    sweep(path=tope_muelle_dcho_path.line, transition=Transition.RIGHT)

    # Taladro_central: sweep along a curve in space
    with BuildLine() as taladro_central_path:
        Line((420.979150392, 386.171412734, 0), (435.506500544, 392.876343573, 0))
    # Taladro_central profile (on start of the path) → Taladro_central (sweep, cut)
    with BuildSketch(Plane(origin=(420.979150392, 386.171412734, 0), x_dir=(-0.4190581774617496, 0.9079593845004504, 0), z_dir=(0.9079593845004504, 0.4190581774617496, 0))):
        Circle(TALADRO_CENTRAL_PROFILE_R)
    sweep(path=taladro_central_path.line, mode=Mode.SUBTRACT)

    # Rosca_pivote_izq: sweep along a curve in space
    with BuildLine() as rosca_pivote_izq_path:
        Line((425.518947314, 381.107793089, -26), (442.77017562, 389.069898461, -26))
    # Rosca_pivote_izq profile (on start of the path) → Rosca_pivote_izq (sweep, cut)
    with BuildSketch(Plane(origin=(425.518947314, 381.107793089, -26), x_dir=(-0.41905817746174734, 0.9079593845004515, 0), z_dir=(0.9079593845004515, 0.41905817746174734, 0))):
        Circle(ROSCA_PIVOTE_IZQ_PROFILE_R)
    sweep(path=rosca_pivote_izq_path.line, mode=Mode.SUBTRACT)

    # Rosca_pivote_dcho: sweep along a curve in space
    with BuildLine() as rosca_pivote_dcho_path:
        Line((425.518947314, 381.107793089, 26), (442.77017562, 389.069898461, 26))
    # Rosca_pivote_dcho profile (on start of the path) → Rosca_pivote_dcho (sweep, cut)
    with BuildSketch(Plane(origin=(425.518947314, 381.107793089, 26), x_dir=(-0.41905817746174734, 0.9079593845004515, 0), z_dir=(0.9079593845004515, 0.41905817746174734, 0))):
        Circle(ROSCA_PIVOTE_DCHO_PROFILE_R)
    sweep(path=rosca_pivote_dcho_path.line, mode=Mode.SUBTRACT)


solid = part.part
